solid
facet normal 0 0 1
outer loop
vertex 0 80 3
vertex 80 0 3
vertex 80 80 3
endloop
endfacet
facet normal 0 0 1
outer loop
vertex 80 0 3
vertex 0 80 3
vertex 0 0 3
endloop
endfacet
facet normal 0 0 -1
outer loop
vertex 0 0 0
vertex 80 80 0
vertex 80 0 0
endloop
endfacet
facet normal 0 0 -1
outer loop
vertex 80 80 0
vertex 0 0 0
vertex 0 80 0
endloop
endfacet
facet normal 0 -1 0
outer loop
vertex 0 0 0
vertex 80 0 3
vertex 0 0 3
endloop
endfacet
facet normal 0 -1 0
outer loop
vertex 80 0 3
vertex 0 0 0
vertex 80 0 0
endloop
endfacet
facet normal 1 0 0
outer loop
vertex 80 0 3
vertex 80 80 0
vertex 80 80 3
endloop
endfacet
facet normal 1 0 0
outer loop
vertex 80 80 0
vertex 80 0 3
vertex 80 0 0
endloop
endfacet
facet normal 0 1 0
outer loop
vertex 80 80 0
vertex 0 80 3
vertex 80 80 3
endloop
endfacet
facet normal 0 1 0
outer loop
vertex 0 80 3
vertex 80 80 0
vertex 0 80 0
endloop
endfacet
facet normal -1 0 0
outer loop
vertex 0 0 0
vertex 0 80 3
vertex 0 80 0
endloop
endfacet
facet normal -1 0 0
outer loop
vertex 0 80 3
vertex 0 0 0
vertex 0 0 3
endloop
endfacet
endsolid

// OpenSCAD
/*
Title: Scaffold - Pascal Stack Press Plate
Folder: 15_fluids_pressure
Physics Topic: Planned extension
Difficulty: Scaffold
Print Type: FDM
Teaches: Future concept module
Use Case: Planned classroom extension
*/

// --------------------
// Parameters
// --------------------
base_size = 80;
thickness = 3;

module scaffold_placeholder(){
    cube([base_size,base_size,thickness]);
}

// --------------------
// Physics Meaning
// --------------------
// Scaffold file with geometry placeholder and planned educational direction.

// --------------------
// Learning Notes
// --------------------
// TODO: add activity prompts and comparative parameter sweeps.

// --------------------
// Print Notes
// --------------------
// TODO: finalize orientation and durability tuning.

// --------------------
// Customization Ideas
// --------------------
// TODO: convert placeholder to fully featured model in roadmap sequence.

scaffold_placeholder();
